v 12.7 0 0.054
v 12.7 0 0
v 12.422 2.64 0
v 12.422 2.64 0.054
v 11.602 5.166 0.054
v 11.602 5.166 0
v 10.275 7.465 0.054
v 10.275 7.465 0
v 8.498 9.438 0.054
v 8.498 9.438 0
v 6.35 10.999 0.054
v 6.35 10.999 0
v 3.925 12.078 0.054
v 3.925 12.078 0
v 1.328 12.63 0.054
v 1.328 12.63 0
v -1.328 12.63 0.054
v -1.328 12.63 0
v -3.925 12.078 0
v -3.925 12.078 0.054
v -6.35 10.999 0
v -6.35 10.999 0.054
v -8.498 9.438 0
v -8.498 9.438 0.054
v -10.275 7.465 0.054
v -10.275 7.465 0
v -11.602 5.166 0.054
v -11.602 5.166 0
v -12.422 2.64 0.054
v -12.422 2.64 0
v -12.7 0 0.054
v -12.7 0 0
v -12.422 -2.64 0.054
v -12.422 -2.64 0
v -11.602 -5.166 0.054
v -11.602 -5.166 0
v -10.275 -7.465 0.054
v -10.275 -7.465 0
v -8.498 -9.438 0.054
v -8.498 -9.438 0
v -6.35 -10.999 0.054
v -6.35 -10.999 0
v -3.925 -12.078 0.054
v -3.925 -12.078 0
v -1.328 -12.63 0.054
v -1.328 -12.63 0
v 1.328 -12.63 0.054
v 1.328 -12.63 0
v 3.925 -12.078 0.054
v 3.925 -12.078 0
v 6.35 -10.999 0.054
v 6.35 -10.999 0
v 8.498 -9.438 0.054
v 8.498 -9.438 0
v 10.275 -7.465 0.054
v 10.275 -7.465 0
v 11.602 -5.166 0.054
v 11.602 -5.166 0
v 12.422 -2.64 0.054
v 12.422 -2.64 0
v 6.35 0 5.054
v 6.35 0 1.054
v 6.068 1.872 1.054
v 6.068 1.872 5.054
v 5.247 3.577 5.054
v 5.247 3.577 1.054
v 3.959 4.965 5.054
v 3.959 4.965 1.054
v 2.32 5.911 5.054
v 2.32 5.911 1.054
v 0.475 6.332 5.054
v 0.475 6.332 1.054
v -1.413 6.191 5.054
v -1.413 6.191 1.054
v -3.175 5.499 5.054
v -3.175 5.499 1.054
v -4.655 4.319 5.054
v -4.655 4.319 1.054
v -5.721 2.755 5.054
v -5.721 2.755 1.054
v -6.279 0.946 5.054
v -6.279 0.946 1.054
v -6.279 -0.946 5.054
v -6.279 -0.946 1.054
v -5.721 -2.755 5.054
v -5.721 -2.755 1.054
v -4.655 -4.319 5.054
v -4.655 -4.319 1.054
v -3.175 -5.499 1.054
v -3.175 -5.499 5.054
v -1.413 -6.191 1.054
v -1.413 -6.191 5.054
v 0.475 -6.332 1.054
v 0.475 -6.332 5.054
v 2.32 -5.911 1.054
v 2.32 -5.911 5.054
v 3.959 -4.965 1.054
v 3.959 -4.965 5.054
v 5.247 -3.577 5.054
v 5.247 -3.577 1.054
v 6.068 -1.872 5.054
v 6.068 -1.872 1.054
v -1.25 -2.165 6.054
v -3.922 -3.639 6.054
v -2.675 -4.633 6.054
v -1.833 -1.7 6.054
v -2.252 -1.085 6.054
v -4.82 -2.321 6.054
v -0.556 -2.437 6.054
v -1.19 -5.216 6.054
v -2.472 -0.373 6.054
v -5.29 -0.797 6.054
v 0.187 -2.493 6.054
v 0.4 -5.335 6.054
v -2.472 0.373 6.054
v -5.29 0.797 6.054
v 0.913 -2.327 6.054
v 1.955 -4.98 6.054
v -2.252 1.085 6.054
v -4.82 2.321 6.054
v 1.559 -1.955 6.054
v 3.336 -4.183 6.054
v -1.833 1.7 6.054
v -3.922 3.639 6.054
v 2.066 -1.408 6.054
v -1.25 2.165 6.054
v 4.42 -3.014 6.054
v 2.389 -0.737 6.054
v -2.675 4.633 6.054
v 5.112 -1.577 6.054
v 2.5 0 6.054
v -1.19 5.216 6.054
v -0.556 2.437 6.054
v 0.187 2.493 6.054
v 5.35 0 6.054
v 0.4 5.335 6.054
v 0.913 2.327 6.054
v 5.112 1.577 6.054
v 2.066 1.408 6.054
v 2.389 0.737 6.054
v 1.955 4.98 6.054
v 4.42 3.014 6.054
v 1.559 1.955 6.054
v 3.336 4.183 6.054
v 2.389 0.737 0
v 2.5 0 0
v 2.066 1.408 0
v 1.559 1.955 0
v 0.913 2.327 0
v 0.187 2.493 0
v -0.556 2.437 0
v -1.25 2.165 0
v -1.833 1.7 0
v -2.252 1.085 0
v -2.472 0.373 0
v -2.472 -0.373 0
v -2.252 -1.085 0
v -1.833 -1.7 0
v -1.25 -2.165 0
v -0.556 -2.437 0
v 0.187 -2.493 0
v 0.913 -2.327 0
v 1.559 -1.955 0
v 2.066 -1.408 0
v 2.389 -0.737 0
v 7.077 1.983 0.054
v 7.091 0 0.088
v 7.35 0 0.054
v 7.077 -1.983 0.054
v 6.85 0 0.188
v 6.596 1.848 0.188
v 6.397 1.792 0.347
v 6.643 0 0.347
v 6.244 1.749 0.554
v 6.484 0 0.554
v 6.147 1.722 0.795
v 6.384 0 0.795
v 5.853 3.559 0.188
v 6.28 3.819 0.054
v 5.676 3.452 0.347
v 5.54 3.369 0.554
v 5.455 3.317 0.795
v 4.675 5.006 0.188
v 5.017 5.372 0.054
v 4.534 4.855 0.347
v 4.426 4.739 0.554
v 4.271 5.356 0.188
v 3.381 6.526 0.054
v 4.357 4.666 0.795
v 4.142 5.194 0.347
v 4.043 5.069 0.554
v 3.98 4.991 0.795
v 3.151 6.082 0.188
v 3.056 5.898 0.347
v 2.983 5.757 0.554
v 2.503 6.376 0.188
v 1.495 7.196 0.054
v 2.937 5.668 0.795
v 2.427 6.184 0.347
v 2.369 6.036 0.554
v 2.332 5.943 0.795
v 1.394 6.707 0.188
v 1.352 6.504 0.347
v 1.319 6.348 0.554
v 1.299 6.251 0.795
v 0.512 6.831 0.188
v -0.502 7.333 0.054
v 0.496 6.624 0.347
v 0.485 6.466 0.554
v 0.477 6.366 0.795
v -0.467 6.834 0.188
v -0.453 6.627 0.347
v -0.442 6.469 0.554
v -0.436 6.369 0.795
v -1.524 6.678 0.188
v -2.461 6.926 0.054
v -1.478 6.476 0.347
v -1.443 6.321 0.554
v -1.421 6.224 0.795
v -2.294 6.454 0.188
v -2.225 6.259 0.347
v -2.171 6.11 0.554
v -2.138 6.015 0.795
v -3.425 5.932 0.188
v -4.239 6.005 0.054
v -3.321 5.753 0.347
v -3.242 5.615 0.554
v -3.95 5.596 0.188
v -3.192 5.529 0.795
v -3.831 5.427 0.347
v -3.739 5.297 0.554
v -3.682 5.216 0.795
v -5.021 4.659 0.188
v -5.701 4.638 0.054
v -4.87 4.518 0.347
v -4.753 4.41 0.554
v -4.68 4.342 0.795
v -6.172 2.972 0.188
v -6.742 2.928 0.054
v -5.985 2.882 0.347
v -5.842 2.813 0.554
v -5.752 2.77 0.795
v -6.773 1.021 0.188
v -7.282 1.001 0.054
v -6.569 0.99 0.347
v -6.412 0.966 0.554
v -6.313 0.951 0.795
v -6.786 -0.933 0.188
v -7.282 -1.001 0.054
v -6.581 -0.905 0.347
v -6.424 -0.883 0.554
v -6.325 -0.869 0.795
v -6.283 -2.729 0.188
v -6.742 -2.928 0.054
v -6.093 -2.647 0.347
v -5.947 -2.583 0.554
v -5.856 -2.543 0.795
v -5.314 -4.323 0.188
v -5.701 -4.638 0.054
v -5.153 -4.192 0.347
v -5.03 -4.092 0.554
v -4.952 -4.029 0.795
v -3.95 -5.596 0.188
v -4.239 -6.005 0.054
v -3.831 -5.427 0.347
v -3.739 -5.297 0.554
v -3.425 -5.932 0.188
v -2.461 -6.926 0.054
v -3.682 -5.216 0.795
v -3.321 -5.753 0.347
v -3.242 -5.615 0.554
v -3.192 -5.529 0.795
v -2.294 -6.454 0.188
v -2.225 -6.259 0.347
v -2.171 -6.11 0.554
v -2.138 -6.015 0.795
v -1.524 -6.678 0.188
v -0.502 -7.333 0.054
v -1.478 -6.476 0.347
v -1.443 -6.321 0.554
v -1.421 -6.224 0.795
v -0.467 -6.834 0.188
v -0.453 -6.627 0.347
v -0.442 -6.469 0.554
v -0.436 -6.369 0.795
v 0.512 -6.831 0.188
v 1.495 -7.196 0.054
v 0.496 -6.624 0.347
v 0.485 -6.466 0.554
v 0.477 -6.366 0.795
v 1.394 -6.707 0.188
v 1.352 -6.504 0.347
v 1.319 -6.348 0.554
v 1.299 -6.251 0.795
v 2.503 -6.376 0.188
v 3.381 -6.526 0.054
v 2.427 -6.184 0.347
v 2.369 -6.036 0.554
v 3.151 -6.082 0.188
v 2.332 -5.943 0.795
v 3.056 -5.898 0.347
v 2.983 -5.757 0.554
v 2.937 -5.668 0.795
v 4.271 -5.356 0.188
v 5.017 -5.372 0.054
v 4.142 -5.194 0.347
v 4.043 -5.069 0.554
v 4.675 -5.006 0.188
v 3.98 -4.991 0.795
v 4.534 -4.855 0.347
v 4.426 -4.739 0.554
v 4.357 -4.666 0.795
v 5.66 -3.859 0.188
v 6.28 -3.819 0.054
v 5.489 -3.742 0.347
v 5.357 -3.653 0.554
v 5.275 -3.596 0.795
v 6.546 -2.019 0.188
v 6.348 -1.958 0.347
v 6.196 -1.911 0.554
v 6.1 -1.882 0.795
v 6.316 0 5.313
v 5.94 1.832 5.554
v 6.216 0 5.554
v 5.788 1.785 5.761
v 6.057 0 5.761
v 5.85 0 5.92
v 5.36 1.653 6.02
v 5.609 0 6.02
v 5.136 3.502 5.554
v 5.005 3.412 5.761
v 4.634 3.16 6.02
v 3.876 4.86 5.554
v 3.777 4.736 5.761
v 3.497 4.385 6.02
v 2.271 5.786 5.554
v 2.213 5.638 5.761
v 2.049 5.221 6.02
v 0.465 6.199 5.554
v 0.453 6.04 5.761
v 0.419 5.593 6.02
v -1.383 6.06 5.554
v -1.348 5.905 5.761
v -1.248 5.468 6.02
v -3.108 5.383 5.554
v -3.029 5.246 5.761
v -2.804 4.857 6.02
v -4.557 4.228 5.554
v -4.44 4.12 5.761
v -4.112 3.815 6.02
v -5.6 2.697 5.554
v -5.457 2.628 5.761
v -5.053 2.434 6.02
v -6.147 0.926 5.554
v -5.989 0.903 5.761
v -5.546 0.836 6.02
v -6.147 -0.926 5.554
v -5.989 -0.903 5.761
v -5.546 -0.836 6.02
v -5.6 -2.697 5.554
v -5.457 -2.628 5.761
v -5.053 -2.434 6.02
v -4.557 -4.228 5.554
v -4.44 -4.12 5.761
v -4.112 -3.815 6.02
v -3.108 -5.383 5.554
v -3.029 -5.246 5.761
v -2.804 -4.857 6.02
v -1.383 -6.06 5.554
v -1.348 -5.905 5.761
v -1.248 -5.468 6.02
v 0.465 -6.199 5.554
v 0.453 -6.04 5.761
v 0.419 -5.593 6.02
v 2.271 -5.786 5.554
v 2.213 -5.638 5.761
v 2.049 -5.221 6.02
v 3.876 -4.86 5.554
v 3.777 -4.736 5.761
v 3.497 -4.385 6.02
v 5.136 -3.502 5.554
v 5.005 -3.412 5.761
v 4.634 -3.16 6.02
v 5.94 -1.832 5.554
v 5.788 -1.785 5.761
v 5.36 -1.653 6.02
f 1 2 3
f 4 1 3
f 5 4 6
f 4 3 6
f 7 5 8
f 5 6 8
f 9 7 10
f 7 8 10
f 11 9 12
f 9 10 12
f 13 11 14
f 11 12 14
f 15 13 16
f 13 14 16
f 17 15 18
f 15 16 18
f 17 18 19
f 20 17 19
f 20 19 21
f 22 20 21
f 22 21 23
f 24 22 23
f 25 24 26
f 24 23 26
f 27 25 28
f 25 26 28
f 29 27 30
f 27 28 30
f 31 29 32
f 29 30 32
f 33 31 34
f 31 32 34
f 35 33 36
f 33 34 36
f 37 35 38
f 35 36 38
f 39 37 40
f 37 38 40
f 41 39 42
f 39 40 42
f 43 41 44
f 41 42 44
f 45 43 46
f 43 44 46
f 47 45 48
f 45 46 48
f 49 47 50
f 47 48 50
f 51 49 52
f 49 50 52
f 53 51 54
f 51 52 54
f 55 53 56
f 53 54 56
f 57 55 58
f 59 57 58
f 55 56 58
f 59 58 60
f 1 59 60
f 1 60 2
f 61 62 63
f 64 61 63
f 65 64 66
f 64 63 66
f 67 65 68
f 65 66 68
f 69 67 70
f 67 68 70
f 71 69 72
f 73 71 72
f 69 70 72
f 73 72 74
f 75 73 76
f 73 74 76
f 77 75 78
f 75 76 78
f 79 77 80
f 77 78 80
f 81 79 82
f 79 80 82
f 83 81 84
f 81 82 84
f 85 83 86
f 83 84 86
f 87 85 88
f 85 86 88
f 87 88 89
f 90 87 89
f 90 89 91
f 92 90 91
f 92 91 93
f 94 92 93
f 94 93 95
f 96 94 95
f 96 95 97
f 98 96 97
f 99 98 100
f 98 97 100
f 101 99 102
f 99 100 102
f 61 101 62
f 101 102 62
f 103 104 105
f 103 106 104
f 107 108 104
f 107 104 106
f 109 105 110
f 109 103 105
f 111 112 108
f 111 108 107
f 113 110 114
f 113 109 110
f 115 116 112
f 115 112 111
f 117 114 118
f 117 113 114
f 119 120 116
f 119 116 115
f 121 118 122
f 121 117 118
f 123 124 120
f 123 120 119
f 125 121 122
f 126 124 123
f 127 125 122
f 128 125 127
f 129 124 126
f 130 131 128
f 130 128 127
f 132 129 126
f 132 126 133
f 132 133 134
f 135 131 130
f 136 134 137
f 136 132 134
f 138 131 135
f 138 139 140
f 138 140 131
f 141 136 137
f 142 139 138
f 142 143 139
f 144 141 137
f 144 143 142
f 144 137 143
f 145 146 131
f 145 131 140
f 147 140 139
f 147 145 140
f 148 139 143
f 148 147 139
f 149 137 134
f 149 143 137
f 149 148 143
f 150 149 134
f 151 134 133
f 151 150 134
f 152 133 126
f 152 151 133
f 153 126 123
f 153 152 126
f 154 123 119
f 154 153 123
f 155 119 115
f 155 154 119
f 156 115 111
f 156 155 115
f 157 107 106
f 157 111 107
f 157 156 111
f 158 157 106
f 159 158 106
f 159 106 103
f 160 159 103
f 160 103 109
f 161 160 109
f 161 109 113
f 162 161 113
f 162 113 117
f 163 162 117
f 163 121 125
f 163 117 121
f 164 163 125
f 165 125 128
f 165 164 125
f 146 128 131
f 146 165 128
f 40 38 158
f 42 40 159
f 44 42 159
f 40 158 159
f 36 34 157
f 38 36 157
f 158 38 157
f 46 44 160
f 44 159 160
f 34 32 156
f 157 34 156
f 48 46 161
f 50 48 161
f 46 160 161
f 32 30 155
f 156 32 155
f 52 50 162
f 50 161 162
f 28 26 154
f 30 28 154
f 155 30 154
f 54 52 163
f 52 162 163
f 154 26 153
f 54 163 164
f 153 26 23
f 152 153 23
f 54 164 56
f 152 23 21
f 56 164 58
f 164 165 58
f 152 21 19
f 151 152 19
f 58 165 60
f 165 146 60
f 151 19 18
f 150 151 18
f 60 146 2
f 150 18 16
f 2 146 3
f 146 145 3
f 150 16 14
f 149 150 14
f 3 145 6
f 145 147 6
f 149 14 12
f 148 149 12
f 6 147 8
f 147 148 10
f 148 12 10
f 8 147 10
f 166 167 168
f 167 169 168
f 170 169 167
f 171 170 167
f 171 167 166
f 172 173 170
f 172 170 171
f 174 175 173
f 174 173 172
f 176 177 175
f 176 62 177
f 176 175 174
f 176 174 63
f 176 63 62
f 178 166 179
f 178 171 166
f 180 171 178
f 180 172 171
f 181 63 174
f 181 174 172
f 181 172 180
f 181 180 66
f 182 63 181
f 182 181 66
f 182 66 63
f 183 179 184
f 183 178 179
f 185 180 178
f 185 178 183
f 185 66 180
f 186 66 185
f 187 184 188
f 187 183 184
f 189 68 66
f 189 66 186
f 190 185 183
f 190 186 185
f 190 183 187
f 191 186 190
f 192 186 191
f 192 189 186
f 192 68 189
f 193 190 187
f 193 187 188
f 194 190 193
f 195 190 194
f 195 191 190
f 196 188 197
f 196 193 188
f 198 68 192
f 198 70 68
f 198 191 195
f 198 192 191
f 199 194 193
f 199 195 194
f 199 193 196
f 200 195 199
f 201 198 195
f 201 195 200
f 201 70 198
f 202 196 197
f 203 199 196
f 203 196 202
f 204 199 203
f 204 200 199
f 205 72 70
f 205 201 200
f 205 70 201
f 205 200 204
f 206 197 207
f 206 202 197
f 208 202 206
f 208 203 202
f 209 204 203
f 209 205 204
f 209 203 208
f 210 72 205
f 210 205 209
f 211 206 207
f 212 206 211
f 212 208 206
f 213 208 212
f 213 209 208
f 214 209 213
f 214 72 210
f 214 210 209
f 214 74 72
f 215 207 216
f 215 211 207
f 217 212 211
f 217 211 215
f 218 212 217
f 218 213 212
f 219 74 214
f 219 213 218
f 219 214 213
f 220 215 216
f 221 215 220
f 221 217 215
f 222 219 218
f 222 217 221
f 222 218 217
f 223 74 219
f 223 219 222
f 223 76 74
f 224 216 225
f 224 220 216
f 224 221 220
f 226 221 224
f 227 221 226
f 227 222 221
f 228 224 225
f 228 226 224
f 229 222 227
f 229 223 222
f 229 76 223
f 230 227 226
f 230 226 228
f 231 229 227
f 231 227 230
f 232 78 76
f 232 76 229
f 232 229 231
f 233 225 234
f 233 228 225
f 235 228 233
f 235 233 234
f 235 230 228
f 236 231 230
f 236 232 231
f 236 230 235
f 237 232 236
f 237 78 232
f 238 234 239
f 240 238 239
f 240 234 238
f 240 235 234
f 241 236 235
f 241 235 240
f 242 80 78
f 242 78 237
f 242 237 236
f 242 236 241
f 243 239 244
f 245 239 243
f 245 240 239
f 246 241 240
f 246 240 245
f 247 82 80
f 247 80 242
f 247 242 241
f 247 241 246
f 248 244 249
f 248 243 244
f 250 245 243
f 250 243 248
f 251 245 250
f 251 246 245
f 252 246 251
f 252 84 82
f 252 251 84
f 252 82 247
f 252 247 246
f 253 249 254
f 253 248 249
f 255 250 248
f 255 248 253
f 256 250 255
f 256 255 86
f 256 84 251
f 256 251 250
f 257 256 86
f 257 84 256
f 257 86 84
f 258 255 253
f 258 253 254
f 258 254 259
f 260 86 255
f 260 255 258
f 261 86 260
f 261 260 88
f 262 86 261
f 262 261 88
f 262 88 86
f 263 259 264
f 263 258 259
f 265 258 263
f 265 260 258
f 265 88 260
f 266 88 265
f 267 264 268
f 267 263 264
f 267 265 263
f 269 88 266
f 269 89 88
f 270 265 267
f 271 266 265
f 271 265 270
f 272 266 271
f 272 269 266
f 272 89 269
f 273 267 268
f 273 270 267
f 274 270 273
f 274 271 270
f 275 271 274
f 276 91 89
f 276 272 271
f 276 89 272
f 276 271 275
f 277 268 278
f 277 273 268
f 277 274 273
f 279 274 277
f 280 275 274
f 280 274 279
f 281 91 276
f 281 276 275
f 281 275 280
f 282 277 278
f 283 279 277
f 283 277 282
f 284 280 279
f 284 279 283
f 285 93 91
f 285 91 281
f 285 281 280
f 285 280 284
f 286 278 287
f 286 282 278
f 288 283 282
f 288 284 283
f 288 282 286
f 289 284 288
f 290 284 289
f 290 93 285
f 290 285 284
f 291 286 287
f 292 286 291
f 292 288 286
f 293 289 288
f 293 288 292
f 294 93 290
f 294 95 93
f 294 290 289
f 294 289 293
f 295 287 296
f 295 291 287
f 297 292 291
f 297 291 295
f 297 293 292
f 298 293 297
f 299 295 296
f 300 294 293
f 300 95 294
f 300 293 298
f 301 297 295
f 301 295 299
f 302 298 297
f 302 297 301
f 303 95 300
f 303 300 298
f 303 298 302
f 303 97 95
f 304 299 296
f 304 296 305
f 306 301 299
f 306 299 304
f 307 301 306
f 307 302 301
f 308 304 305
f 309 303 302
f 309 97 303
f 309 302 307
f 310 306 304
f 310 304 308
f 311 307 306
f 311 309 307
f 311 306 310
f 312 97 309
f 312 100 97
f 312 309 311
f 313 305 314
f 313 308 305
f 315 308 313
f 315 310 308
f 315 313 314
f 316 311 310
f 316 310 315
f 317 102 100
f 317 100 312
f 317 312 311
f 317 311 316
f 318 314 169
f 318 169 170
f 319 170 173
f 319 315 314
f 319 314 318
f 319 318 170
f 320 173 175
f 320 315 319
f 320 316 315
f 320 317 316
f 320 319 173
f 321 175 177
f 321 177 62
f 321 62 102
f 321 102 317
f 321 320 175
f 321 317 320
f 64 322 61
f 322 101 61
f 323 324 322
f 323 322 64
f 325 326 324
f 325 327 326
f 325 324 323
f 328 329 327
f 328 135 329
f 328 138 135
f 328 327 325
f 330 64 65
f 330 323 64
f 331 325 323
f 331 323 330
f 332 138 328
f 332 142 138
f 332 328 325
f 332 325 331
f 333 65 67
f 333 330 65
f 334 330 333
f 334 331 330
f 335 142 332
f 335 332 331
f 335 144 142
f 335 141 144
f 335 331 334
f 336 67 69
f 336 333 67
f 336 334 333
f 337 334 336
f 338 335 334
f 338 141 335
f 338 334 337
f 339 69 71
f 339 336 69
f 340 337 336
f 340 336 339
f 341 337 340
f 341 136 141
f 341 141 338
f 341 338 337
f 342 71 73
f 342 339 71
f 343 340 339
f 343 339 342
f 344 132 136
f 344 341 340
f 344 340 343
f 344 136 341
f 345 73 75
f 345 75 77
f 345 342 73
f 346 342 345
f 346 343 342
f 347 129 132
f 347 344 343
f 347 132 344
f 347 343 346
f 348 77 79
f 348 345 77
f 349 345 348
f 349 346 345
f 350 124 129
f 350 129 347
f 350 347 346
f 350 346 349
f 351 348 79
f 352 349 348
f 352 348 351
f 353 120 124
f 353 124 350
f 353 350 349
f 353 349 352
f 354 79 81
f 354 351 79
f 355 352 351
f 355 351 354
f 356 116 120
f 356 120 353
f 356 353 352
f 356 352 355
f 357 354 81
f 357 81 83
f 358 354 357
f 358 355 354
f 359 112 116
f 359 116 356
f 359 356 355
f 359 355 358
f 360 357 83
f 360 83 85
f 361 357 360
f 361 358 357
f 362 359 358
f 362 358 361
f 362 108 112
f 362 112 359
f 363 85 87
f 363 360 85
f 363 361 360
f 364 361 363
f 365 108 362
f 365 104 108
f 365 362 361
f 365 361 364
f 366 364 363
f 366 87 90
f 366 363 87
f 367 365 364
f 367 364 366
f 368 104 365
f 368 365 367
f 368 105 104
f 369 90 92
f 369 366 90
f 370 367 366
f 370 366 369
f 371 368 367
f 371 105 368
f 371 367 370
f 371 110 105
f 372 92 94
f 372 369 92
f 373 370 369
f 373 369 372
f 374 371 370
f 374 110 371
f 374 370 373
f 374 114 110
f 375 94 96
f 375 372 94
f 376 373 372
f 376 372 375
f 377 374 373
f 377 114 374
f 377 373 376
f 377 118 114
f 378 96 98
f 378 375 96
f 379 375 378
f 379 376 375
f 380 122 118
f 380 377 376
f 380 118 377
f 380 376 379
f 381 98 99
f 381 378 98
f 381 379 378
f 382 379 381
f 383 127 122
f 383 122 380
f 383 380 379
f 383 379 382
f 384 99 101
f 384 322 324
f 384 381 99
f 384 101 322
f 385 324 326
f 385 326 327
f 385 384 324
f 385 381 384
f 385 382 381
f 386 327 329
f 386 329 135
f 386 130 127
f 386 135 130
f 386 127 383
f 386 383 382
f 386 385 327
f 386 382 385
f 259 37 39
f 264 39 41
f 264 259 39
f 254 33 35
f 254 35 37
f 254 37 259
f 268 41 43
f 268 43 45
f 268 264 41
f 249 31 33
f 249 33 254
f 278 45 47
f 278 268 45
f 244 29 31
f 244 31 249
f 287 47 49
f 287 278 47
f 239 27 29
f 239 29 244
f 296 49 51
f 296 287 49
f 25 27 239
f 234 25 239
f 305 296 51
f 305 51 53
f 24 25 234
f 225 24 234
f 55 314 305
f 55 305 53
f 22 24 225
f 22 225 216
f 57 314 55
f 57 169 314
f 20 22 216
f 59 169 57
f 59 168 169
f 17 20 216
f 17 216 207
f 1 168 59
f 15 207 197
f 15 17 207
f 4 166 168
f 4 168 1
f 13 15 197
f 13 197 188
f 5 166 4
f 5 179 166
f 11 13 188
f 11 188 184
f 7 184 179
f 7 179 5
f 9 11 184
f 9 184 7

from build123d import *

# Parameters (mm, degrees)
SZKIC1_R                        = 12.7
DODANIE_WYCI_GNI_CIE1_DEPTH     = 0.054
SZKIC2_R                        = 6.35
DODANIE_WYCI_GNI_CIE2_DEPTH     = 6
WYTNIJ_WYCI_GNI_CIE1_DEPTH      = 19.953387982
WYTNIJ_WYCI_GNI_CIE1_DEPTH_BACK = 19.953387982
SZKIC3_R                        = 2.5
ZAOKR_GLENIE2_R                 = 1


with BuildPart() as part:
    # Szkic1 → Dodanie-wyciągnięcie1 (new body)
    with BuildSketch(Plane.XY):
        Circle(SZKIC1_R)
    extrude(amount=DODANIE_WYCI_GNI_CIE1_DEPTH)

    # Szkic2 → Dodanie-wyciągnięcie2 (add)
    with BuildSketch(Plane.XY.offset(0.054)):
        Circle(SZKIC2_R)
    extrude(amount=DODANIE_WYCI_GNI_CIE2_DEPTH)

    # Szkic3 → Wytnij-wyciągnięcie1 (cut, two sides: drawn at the far end of the back side and taken through both)
    with BuildSketch(Plane.XY.offset(6.054).offset(-WYTNIJ_WYCI_GNI_CIE1_DEPTH_BACK)):
        Circle(SZKIC3_R)
    extrude(amount=WYTNIJ_WYCI_GNI_CIE1_DEPTH + WYTNIJ_WYCI_GNI_CIE1_DEPTH_BACK, mode=Mode.SUBTRACT)

    # Zaokrąglenie2
    zaokr_glenie2_edges = [part.edges().sort_by_distance(p)[0] for p in [
        (-6.35, 0, 0.054),
        (-6.35, 0, 6.054),
    ]]
    fillet(zaokr_glenie2_edges, radius=ZAOKR_GLENIE2_R)


solid = part.part
